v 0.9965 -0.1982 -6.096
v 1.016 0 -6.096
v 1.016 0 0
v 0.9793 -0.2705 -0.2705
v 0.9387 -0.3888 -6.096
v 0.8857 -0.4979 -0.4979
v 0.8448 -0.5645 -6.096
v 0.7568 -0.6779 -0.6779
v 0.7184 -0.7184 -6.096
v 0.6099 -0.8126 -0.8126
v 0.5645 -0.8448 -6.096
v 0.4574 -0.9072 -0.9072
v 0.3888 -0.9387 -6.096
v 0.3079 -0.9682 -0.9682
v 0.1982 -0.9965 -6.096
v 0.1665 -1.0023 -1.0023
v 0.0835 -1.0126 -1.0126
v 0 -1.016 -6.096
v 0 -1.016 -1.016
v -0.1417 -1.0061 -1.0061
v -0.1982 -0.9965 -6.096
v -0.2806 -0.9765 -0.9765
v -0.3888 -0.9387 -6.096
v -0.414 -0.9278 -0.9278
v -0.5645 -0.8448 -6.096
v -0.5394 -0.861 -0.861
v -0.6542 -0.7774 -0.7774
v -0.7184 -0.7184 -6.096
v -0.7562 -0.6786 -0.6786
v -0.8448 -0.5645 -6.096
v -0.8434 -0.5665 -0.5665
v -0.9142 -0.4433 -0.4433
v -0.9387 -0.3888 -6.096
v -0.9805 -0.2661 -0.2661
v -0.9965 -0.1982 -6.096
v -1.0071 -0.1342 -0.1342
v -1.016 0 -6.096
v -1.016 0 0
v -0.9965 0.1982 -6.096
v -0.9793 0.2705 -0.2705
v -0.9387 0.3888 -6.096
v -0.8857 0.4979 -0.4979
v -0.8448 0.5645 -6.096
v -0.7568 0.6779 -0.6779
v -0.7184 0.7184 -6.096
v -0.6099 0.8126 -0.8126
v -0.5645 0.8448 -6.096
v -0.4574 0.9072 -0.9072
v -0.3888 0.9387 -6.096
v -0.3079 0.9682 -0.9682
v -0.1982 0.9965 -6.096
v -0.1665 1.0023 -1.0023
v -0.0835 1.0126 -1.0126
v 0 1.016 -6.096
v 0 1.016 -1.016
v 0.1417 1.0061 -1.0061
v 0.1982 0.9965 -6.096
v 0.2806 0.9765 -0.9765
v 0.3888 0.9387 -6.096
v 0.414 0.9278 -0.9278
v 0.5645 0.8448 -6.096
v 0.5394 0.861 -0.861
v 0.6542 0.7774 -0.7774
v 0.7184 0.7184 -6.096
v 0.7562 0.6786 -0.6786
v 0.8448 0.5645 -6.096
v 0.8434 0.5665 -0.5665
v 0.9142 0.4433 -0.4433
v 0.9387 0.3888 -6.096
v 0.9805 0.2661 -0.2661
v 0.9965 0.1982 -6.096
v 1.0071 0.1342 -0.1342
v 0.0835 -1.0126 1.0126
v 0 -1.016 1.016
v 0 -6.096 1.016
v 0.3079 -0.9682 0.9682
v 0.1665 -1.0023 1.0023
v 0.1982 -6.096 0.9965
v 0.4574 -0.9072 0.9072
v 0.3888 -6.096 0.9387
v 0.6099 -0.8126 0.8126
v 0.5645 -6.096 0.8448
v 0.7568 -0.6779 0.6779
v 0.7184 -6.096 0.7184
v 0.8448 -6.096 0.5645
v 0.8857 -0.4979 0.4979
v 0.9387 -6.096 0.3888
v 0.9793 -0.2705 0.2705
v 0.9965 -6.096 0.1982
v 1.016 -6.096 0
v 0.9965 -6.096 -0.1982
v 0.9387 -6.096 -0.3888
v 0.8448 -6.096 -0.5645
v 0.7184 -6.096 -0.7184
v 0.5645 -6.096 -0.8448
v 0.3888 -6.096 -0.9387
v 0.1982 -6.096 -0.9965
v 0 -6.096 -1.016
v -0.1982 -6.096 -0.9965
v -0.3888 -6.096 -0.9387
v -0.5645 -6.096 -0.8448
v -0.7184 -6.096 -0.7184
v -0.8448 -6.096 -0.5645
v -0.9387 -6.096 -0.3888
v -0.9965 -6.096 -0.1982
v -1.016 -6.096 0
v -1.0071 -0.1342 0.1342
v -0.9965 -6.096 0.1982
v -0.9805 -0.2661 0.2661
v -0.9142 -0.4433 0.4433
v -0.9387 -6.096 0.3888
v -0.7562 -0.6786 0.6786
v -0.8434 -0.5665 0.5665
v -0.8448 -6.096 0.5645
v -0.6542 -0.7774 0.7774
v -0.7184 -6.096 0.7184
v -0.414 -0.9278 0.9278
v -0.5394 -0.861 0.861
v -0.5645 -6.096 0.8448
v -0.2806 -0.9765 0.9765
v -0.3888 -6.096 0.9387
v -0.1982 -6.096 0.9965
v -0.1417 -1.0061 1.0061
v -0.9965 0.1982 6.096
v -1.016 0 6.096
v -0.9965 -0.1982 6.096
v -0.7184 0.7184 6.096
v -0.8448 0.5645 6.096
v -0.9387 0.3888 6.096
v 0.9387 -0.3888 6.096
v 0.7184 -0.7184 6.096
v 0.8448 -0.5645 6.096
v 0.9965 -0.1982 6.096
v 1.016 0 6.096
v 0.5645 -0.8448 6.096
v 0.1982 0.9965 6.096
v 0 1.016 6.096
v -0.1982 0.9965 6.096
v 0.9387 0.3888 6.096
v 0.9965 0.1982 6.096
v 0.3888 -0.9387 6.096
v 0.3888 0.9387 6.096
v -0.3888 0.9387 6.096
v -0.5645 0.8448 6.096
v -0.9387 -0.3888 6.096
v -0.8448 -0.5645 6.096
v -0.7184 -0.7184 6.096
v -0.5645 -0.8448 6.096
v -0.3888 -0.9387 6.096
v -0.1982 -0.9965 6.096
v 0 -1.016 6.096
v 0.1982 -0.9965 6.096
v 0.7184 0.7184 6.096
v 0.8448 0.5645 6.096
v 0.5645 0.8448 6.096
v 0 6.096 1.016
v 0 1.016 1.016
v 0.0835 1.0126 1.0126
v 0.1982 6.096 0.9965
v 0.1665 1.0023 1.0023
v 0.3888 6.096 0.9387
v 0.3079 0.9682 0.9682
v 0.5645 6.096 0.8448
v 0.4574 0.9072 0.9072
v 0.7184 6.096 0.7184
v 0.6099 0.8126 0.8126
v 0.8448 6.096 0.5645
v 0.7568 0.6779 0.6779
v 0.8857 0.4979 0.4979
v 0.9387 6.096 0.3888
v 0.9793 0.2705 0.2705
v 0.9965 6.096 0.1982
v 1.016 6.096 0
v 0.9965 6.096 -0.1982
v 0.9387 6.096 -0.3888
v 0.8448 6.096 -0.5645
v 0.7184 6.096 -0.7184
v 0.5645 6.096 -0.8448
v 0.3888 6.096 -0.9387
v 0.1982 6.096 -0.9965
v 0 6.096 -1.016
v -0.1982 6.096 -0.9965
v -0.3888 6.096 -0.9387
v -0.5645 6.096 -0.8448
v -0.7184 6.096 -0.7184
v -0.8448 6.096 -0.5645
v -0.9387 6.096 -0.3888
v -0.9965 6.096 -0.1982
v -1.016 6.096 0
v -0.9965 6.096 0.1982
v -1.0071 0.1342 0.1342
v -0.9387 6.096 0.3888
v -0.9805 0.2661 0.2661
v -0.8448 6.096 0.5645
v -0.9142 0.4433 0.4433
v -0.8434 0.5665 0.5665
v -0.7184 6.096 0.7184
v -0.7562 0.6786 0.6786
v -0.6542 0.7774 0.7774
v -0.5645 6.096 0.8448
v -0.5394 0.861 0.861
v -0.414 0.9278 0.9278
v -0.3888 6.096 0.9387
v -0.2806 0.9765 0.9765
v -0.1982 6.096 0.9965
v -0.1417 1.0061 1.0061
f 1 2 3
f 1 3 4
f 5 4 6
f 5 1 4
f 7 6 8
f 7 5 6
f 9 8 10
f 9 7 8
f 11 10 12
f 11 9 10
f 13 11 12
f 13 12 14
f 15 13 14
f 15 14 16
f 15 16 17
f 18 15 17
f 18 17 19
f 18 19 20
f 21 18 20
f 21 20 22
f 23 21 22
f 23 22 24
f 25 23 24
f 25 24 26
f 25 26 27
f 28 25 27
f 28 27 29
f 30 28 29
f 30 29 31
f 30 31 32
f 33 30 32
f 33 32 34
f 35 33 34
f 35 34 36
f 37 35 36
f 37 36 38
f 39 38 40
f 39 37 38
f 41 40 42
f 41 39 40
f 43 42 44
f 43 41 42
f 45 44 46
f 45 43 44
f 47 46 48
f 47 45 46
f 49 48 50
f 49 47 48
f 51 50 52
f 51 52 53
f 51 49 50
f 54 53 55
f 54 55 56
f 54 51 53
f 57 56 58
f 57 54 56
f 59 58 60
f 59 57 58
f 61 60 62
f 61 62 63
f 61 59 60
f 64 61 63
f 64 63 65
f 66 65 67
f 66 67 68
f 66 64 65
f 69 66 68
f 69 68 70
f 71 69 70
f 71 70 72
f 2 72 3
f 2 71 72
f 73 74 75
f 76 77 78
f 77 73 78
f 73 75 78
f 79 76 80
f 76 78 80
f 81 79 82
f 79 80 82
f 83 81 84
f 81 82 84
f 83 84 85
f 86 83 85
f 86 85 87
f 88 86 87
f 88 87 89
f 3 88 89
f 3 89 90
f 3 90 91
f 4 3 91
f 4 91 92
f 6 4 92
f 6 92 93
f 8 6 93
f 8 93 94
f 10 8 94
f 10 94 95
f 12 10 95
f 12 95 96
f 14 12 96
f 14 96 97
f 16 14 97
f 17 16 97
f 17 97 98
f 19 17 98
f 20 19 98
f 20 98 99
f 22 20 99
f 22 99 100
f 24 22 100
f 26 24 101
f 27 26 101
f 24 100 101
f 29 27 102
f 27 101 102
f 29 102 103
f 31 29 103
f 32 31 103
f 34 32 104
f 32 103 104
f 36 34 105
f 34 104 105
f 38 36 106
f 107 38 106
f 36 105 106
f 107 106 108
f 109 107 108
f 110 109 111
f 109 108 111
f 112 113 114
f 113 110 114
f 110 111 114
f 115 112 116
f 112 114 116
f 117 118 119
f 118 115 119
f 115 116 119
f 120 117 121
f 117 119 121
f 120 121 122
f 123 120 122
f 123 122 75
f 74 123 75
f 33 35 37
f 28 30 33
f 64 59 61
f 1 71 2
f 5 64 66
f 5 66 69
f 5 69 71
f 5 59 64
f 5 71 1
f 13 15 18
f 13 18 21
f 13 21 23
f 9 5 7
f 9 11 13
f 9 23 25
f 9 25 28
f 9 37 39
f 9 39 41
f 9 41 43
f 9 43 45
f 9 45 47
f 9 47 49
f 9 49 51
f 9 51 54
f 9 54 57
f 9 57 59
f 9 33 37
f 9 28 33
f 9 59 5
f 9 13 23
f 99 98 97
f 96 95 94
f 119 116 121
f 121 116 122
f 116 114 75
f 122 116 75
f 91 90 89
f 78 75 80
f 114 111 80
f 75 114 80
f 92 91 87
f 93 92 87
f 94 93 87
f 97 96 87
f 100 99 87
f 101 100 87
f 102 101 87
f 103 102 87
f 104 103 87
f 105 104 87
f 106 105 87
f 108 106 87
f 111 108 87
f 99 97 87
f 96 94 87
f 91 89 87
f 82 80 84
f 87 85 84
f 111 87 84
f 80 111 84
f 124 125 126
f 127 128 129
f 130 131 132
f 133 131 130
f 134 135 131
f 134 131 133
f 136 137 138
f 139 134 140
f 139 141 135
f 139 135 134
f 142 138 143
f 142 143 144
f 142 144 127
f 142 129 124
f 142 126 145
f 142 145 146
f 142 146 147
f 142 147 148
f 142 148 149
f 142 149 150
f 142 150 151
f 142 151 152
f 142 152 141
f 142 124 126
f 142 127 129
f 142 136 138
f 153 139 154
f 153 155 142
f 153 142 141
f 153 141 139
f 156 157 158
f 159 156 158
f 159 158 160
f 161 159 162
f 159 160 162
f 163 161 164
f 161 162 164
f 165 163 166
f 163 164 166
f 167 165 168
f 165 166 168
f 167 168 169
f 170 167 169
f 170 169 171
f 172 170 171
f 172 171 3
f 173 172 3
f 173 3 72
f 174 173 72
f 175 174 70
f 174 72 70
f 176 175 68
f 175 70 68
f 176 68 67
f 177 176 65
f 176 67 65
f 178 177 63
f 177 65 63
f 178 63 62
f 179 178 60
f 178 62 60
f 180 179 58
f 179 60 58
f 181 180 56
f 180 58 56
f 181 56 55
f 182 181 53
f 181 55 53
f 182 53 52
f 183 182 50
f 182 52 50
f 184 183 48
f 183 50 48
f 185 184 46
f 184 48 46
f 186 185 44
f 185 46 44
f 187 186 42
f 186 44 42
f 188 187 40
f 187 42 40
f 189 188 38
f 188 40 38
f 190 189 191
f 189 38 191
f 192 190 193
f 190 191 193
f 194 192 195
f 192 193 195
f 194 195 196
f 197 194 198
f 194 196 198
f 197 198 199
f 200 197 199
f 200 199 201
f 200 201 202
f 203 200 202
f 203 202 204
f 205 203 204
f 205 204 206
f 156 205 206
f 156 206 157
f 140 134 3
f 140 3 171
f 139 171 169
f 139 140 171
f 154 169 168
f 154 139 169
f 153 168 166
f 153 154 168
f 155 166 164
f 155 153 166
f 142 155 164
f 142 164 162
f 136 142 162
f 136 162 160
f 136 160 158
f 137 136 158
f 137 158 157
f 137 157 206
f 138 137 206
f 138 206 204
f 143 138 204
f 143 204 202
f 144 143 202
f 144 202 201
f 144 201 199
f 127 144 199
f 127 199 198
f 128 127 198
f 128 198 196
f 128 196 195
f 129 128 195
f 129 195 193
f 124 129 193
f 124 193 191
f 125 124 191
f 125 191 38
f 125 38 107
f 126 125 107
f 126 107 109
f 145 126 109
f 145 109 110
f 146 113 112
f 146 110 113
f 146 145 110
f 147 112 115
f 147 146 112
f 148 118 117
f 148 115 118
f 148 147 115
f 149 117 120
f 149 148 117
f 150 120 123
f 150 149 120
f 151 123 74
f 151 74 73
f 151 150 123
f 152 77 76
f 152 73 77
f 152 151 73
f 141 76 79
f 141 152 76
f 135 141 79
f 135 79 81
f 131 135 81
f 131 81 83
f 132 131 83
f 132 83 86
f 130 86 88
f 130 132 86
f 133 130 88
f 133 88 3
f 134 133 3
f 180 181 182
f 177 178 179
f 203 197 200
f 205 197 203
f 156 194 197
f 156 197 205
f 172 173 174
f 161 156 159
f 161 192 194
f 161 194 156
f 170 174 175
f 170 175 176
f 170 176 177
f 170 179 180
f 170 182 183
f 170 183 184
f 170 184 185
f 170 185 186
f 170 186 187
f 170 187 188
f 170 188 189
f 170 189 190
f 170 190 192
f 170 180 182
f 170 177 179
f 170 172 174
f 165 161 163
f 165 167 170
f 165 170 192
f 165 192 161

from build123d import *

# Parameters (mm, degrees)
SKETCH1_W                = 1.016
SKETCH1_H                = 6.096
BOSS_EXTRUDE1_DEPTH      = 6.096
BOSS_EXTRUDE1_DEPTH_BACK = 6.096
SKETCH2_R                = 1.016
BOSS_EXTRUDE2_START      = 6.096
SKETCH3_R                = 1.016
BOSS_EXTRUDE2_DEPTH      = 6.096


with BuildPart() as part:
    # Sketch1 → Revolve2 (revolve)
    with BuildSketch(Plane(origin=(0, 0, 0), x_dir=(1, 0, 0), z_dir=(0, 1, 0))):
        with Locations((-0.508, 3.048)):
            Rectangle(SKETCH1_W, SKETCH1_H)
    revolve(axis=Axis((0, 0, 0), (0, 0, -1)))

    # Sketch2 → Boss-Extrude1 (add, two sides: drawn at the far end of the back side and taken through both)
    with BuildSketch(Plane(origin=(0, 0, 0), x_dir=(1, 0, 0), z_dir=(0, 1, 0)).offset(-BOSS_EXTRUDE1_DEPTH_BACK)):
        Circle(SKETCH2_R)
    extrude(amount=BOSS_EXTRUDE1_DEPTH + BOSS_EXTRUDE1_DEPTH_BACK)

    # Sketch3 → Boss-Extrude2 (add)
    with BuildSketch(Plane.XY.offset(BOSS_EXTRUDE2_START)):
        Circle(SKETCH3_R)
    extrude(amount=-BOSS_EXTRUDE2_DEPTH)


solid = part.part
